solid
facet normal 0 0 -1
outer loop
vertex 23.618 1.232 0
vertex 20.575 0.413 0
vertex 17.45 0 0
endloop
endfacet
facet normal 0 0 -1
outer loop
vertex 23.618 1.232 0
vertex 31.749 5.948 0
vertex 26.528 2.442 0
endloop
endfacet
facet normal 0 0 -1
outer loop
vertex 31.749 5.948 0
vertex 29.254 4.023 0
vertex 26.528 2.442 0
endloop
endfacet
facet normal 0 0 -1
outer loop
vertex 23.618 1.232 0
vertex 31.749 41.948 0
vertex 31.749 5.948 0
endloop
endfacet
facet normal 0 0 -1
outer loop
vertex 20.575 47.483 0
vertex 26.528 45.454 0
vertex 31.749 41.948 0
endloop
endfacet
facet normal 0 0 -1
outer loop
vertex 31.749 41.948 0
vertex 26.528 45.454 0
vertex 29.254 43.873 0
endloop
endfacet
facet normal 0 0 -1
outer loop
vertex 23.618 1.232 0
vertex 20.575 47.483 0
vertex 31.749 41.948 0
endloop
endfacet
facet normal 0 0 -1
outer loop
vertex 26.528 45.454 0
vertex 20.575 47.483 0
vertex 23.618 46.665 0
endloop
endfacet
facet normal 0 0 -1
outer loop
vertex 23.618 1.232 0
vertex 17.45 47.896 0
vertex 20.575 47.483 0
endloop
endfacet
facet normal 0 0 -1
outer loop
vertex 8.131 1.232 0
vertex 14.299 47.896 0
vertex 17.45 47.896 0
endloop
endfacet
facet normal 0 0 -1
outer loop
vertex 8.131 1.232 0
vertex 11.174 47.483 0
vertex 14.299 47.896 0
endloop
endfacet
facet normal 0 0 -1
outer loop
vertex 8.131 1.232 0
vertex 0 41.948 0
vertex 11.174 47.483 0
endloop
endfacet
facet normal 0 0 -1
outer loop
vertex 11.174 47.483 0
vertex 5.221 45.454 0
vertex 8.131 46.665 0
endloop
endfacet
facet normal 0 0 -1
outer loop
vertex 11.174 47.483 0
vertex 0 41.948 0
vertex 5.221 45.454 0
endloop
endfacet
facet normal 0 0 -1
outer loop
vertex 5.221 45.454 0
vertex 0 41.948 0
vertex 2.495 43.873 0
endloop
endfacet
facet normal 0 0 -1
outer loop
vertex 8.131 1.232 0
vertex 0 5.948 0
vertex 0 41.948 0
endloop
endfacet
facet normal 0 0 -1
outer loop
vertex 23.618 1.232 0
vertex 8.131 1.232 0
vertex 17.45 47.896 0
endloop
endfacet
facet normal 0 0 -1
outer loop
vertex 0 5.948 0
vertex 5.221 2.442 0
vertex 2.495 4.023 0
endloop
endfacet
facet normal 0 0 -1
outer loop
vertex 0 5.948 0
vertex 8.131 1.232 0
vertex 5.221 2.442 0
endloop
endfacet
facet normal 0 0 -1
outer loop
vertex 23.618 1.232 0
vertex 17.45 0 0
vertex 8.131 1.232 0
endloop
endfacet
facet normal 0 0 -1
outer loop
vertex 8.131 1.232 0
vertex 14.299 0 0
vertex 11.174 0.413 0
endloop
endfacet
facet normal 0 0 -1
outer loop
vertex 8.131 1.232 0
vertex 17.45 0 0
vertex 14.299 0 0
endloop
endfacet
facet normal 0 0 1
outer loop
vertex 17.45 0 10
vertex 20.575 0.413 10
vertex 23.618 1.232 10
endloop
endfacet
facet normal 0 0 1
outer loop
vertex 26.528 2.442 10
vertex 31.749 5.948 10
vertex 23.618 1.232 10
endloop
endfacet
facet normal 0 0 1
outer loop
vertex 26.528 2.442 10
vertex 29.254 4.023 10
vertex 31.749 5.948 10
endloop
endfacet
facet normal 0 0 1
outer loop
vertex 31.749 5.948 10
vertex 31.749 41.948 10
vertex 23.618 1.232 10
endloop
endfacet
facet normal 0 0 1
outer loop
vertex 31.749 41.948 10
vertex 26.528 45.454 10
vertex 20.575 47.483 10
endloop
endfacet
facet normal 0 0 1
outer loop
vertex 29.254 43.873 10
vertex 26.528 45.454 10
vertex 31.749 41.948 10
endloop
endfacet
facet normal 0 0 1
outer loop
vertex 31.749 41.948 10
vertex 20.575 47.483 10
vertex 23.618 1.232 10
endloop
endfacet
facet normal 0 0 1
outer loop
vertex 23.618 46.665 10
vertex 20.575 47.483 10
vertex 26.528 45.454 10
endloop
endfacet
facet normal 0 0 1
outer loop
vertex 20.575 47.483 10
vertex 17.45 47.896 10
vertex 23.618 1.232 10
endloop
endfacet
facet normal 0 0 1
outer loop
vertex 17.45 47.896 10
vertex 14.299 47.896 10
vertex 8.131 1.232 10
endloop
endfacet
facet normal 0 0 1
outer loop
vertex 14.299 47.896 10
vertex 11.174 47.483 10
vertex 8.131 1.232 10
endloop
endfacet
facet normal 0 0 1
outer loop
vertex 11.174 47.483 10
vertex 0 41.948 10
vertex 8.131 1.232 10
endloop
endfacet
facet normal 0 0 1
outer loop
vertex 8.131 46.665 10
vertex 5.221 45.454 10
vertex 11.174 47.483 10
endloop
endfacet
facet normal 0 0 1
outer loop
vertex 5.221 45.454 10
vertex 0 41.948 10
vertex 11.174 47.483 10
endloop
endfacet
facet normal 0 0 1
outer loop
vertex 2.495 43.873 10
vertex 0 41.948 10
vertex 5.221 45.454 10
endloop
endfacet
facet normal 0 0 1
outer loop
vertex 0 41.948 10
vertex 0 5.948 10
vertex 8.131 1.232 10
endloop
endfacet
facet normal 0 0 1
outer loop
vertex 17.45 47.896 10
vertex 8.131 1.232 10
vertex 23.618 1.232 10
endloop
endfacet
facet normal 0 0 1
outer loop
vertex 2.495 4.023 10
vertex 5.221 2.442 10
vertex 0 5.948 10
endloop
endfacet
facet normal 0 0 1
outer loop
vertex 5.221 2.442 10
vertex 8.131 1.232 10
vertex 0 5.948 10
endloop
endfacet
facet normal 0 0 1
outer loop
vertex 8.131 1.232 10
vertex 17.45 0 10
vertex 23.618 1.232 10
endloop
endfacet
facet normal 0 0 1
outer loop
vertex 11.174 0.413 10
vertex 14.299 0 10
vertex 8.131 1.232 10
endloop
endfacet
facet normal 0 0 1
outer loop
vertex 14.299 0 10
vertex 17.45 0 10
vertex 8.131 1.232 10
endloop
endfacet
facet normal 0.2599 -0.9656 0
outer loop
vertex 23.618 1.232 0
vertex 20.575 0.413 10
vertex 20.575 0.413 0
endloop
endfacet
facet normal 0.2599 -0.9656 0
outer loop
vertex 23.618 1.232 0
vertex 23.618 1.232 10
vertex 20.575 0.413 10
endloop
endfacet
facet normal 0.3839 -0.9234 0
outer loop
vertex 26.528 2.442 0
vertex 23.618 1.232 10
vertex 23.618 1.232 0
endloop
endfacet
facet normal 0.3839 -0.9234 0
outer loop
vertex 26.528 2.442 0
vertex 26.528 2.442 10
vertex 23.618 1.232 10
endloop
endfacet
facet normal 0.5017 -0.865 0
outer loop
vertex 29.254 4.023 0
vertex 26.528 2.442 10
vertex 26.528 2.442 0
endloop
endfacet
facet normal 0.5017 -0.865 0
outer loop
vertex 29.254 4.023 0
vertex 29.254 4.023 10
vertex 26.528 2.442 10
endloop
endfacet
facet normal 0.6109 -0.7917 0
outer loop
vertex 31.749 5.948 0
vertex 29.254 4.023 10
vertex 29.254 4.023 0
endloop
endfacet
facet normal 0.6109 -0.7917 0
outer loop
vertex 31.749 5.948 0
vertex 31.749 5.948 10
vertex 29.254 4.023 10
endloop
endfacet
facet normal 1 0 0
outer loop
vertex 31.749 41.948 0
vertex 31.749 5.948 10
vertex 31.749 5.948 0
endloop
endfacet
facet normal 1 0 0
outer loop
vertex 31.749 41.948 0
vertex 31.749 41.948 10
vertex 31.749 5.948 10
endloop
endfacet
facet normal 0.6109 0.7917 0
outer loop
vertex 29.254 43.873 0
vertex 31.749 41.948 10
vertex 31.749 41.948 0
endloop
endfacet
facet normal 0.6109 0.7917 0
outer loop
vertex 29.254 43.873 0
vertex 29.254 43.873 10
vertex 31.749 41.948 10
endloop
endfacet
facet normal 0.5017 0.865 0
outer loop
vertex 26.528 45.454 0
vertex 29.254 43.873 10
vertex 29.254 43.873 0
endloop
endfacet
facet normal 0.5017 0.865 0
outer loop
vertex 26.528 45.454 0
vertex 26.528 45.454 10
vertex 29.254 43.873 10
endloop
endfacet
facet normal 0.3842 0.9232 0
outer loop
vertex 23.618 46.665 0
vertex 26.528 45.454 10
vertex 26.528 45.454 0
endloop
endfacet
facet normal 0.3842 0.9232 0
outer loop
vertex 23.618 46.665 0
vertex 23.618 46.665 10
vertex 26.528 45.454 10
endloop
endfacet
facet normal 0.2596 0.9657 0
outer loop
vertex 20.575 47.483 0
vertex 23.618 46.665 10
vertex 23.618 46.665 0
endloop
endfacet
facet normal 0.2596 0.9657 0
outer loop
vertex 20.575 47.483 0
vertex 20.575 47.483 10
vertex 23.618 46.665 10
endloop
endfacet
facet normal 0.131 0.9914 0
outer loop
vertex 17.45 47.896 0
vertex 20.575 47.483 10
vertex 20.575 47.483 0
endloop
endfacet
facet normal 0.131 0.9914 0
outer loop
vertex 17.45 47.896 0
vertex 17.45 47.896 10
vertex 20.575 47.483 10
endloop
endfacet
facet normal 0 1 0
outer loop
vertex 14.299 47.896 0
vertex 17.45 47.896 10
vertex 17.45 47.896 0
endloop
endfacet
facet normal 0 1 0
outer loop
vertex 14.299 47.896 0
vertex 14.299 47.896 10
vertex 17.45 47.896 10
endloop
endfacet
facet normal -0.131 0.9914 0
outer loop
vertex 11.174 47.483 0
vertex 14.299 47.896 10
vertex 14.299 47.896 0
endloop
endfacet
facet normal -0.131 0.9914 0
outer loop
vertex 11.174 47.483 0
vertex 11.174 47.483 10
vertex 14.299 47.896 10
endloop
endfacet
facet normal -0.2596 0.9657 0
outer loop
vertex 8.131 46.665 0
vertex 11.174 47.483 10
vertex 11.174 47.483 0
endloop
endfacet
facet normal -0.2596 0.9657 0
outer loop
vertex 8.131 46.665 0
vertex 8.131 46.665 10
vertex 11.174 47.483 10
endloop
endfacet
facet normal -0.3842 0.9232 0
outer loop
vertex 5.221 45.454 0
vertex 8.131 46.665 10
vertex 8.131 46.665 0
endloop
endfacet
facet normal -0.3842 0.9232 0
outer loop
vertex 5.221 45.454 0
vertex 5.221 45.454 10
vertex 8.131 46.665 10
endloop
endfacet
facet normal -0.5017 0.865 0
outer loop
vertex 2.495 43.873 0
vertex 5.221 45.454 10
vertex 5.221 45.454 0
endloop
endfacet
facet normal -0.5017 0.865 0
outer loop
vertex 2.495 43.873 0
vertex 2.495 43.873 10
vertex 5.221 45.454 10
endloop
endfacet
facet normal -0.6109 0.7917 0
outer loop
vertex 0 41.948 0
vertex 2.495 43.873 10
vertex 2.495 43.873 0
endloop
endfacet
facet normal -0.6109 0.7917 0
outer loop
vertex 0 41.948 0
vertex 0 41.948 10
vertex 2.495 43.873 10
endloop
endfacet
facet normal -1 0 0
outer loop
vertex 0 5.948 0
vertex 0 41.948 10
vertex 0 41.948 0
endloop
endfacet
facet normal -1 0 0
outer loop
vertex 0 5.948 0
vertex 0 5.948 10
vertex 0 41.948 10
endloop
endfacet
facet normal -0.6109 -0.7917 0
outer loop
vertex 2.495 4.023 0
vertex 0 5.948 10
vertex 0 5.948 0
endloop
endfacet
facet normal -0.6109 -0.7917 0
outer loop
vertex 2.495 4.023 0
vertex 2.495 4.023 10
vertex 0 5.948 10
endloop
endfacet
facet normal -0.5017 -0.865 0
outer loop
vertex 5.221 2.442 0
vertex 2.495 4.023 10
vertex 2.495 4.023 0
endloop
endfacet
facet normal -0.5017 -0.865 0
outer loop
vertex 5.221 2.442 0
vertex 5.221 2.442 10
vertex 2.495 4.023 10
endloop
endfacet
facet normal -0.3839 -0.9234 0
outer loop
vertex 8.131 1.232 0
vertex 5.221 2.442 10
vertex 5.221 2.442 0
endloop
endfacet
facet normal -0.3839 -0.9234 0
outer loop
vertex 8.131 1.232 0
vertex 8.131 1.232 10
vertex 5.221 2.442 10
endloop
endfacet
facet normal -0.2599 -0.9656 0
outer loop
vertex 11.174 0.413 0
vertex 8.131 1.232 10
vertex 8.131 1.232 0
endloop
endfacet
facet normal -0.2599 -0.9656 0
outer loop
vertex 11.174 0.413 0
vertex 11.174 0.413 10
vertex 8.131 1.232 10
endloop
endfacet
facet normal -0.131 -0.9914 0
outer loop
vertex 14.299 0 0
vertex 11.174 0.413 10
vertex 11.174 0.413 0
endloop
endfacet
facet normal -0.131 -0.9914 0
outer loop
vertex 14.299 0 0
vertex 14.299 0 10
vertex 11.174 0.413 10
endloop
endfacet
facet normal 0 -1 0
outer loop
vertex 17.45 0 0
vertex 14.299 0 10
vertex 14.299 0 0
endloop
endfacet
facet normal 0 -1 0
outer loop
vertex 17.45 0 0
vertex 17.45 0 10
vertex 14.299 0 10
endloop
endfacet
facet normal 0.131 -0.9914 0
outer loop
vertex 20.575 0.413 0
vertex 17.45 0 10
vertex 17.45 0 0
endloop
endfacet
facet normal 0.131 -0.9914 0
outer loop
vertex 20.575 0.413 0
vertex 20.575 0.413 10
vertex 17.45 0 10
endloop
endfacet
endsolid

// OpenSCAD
$fn = 32;

// ----------------------------------------------------------------------
// Eccentric disc: double_d, 10 mm thick
// ----------------------------------------------------------------------

// --- parameters (mm) ---
profile_height = 10;      // extrusion height
profile_points = 24;      // points of the closed outline

profile = [[31.749, 41.948], [29.254, 43.873], [26.528, 45.454], [23.618, 46.665], [20.575, 47.483], [17.45, 47.896], [14.299, 47.896], [11.174, 47.483], [8.131, 46.665], [5.221, 45.454], [2.495, 43.873], [0, 41.948], [0, 5.948], [2.495, 4.023], [5.221, 2.442], [8.131, 1.232], [11.174, 0.413], [14.299, 0], [17.45, 0], [20.575, 0.413], [23.618, 1.232], [26.528, 2.442], [29.254, 4.023], [31.749, 5.948]];  // single closed polygon, 24 points, counter clockwise

// --- the one profile operation ---
linear_extrude(height = profile_height) polygon(points = profile);
